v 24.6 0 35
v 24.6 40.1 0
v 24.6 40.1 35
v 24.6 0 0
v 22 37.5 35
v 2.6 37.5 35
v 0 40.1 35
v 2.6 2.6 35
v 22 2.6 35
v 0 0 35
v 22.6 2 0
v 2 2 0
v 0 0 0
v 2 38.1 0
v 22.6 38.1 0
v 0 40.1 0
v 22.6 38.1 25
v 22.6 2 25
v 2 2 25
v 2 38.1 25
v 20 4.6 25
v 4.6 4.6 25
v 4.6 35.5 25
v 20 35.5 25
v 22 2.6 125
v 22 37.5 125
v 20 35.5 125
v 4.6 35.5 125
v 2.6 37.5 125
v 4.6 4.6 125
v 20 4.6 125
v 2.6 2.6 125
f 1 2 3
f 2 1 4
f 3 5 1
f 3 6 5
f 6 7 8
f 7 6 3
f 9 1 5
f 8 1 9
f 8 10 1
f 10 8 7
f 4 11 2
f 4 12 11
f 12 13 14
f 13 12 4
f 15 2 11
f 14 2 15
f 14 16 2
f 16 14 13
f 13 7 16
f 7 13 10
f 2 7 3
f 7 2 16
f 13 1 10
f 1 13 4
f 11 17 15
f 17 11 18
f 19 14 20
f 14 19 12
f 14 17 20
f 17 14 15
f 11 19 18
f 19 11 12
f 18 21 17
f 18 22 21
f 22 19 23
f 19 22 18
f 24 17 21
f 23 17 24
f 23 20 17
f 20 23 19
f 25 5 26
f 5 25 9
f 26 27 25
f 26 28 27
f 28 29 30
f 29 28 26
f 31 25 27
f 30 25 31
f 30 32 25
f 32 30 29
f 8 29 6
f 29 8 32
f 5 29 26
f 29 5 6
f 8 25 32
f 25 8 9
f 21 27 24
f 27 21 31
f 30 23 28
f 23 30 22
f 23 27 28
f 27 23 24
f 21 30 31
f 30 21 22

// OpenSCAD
// file: hydration_bladder_dryer_common.scad
// Note: This drives the width of the opening and the tube and must 
// be big enough (e.g. actual + 0.5mm) to prevent an overly tight fit.
blowerPortWidth=15.5;

// This dictates the strength of the tower tube.  It will be printed
// in layers, so this must be thick enough to not be overly fragile.
towerWallThickness=2;

// Outer measurement for the long side of the tube tower on the base
tubeTowerLength=35;

// Outer measurement for the short side of the tube tower on the base
tubeTowerWidth=blowerPortWidth+(towerWallThickness*2);
// file: box_tube_modules.scad
translate([50,0,0]) boxTube(20,35,50,1.5);

boxTubeReduction(20,35,2,0.5,75,20,15,0);

module boxTube(innerX, innerY, height, wallThickness) {
    internalOverlap=0.05;
    difference() {
        cube([innerX+wallThickness*2, innerY+wallThickness*2, height]);
        translate([wallThickness, wallThickness, -internalOverlap]) {
            cube([innerX, innerY, height+internalOverlap*2]);
        }
    }
}


/*
 * Creates a larger box tube into which another can insert
 * and a smaller box tube which would insert into the same
 * size opening as the larger box tube.
 *
 * The reason this is factored out as a module is that it
 * isn't trivial to "glue" the inner and outer boxes 
 * together.  Because this is intended to be used for 3D
 * printing, there must be some tolerance allowed for the
 * inner and outer pieces to actually fit together.  This
 * means the inner dimensions of the insertion box tube
 * must be slightly expanded, but the outer dimensions of
 * the smaller box tube cannot be.  This leaves a gap that
 * must be filled with a strategicly translated 3rd box tube
 * that is big enough to overlap both the inner and outer
 * surfaces of that gap and "glue" it together into the same
 * object, but only where the smaller and larger tubes intersect.
 * 
 * This is sorta how it looks in a cross section.
 *
 *        |             |  <--- inner
 *        |             |
 *      |||             |||
 *      |||             |||
 *      |\               /|
 *      | \             / |  <--- outer
 *      |  \__"glue"___/  |
 *
 * overlap = thin margin added to inner and outer dimensions
 *    to make the object merge with exact sized items in
 *    the model to which the object is returned.
 */
module boxTubeReduction(matedWidth, matedLength, 
        wallThickness, toleranceGap, 
        coreTubeLength, slipInsertionDepth,
        coreToSlipOverlapDepth, overlap) {
    internalOverlap=0.05;
    coreTubeInnerWidth=matedWidth-wallThickness*2;
    coreTubeInnerLength=matedLength-wallThickness*2;
    union() {
        boxTube(matedWidth+toleranceGap*2, 
                matedLength+toleranceGap*2, 
                slipInsertionDepth+coreToSlipOverlapDepth,
                wallThickness);
        // Since expanding the slip tube leaves a gap between it
        // and the outer surface of the core tube, the gap needs
        // to be filled to connect the model.
        // Note: The thickness of this tube is 1 * toleranceGap, 
        // but to overlap both outer and inner tubes, it expanded
        // by internalOverlap * 2 and positioned -1 * internalOverlap
        translate([wallThickness-internalOverlap,
                wallThickness-internalOverlap,
                slipInsertionDepth]) {
            // inner size starts at the core tube outer size (width or length
            // + 2x wall thickness) and is shrunk by 1 x slipTolerance, which is
            // really 2 * 1/2 * slipTolerance (i.e. 1/2 on each side * 2 sides).
            boxTube(matedWidth-internalOverlap*2,
                    matedLength-internalOverlap*2,
                    coreToSlipOverlapDepth,
                    toleranceGap+internalOverlap*2);
        }

        /* Core Part of Tube
         * Note: The slip tube internal size is adjusted by "overlap,"
         * so the core tube position must be centered by positioning at
         * -1 overlap in both X and Y directions.
         * Note: Length of core tube accounts for the slip overlap on both ends
         * and it is positioned lower by the slip overlap on one end.
         */
        translate([wallThickness+toleranceGap-overlap,
                wallThickness+toleranceGap-overlap,
                slipInsertionDepth]) {
            boxTube(coreTubeInnerWidth,
                    coreTubeInnerLength, 
                coreTubeLength,
                wallThickness+overlap);
        }
    }
}
// main file
use <box_tube_modules.scad>
include <hydration_bladder_dryer_common.scad>

/*
 * This tube extends the base, or another extension
 * by slipping over the end of the next tube.
 * Note: For now, it's gravity fit, or could be glued.
 * TODO: Add a snap-fit notch or tab of some kind.
 *    Idea: Clip a slot through the corners on the
 *    slip-over part of the tube with a matching notch
 *    on the inserted tube so a paperclip (or any wire
 *    with a bit of springiness) would click in and 
 *    retain the connection.
 */

// Calculated from variables in the common file.
tubeInnerWidth=tubeTowerWidth-towerWallThickness*2;
tubeInnerLength=tubeTowerLength-towerWallThickness*2;

/*
 * This is the amount of height that the tube actually
 * contributes to the overall length of the tube,
 * without the slip/insertion overlapped part.
 * Note: At 100mm each, a normal bladder would require
 * 3 of them stacked up.
 */
tubeCoreHeight=100;

// Specifies how much insertion room there is
tubeSlipInsertionDepth=25;
tubeSlipOverlap=10;

// Millimeters clearance on either side of the box
// "slip" tube to allow a bit of room for the regular
// sized tube to slide in.
slipTolerance=0.6;

overlap=0.05;

// Calculated
tubeSlipInnerWidth=tubeInnerWidth+towerWallThickness*2-overlap*2;
tubeSlipInnerLength=tubeInnerLength+towerWallThickness*2-overlap*2;

/*
 * This creates a stepdown box with enough clearance for
 * one end to slip over the other end.
 */
boxTubeReduction(tubeSlipInnerWidth, tubeSlipInnerLength,
        towerWallThickness, slipTolerance,
        tubeCoreHeight,tubeSlipInsertionDepth,
        tubeSlipOverlap, 0);
        
